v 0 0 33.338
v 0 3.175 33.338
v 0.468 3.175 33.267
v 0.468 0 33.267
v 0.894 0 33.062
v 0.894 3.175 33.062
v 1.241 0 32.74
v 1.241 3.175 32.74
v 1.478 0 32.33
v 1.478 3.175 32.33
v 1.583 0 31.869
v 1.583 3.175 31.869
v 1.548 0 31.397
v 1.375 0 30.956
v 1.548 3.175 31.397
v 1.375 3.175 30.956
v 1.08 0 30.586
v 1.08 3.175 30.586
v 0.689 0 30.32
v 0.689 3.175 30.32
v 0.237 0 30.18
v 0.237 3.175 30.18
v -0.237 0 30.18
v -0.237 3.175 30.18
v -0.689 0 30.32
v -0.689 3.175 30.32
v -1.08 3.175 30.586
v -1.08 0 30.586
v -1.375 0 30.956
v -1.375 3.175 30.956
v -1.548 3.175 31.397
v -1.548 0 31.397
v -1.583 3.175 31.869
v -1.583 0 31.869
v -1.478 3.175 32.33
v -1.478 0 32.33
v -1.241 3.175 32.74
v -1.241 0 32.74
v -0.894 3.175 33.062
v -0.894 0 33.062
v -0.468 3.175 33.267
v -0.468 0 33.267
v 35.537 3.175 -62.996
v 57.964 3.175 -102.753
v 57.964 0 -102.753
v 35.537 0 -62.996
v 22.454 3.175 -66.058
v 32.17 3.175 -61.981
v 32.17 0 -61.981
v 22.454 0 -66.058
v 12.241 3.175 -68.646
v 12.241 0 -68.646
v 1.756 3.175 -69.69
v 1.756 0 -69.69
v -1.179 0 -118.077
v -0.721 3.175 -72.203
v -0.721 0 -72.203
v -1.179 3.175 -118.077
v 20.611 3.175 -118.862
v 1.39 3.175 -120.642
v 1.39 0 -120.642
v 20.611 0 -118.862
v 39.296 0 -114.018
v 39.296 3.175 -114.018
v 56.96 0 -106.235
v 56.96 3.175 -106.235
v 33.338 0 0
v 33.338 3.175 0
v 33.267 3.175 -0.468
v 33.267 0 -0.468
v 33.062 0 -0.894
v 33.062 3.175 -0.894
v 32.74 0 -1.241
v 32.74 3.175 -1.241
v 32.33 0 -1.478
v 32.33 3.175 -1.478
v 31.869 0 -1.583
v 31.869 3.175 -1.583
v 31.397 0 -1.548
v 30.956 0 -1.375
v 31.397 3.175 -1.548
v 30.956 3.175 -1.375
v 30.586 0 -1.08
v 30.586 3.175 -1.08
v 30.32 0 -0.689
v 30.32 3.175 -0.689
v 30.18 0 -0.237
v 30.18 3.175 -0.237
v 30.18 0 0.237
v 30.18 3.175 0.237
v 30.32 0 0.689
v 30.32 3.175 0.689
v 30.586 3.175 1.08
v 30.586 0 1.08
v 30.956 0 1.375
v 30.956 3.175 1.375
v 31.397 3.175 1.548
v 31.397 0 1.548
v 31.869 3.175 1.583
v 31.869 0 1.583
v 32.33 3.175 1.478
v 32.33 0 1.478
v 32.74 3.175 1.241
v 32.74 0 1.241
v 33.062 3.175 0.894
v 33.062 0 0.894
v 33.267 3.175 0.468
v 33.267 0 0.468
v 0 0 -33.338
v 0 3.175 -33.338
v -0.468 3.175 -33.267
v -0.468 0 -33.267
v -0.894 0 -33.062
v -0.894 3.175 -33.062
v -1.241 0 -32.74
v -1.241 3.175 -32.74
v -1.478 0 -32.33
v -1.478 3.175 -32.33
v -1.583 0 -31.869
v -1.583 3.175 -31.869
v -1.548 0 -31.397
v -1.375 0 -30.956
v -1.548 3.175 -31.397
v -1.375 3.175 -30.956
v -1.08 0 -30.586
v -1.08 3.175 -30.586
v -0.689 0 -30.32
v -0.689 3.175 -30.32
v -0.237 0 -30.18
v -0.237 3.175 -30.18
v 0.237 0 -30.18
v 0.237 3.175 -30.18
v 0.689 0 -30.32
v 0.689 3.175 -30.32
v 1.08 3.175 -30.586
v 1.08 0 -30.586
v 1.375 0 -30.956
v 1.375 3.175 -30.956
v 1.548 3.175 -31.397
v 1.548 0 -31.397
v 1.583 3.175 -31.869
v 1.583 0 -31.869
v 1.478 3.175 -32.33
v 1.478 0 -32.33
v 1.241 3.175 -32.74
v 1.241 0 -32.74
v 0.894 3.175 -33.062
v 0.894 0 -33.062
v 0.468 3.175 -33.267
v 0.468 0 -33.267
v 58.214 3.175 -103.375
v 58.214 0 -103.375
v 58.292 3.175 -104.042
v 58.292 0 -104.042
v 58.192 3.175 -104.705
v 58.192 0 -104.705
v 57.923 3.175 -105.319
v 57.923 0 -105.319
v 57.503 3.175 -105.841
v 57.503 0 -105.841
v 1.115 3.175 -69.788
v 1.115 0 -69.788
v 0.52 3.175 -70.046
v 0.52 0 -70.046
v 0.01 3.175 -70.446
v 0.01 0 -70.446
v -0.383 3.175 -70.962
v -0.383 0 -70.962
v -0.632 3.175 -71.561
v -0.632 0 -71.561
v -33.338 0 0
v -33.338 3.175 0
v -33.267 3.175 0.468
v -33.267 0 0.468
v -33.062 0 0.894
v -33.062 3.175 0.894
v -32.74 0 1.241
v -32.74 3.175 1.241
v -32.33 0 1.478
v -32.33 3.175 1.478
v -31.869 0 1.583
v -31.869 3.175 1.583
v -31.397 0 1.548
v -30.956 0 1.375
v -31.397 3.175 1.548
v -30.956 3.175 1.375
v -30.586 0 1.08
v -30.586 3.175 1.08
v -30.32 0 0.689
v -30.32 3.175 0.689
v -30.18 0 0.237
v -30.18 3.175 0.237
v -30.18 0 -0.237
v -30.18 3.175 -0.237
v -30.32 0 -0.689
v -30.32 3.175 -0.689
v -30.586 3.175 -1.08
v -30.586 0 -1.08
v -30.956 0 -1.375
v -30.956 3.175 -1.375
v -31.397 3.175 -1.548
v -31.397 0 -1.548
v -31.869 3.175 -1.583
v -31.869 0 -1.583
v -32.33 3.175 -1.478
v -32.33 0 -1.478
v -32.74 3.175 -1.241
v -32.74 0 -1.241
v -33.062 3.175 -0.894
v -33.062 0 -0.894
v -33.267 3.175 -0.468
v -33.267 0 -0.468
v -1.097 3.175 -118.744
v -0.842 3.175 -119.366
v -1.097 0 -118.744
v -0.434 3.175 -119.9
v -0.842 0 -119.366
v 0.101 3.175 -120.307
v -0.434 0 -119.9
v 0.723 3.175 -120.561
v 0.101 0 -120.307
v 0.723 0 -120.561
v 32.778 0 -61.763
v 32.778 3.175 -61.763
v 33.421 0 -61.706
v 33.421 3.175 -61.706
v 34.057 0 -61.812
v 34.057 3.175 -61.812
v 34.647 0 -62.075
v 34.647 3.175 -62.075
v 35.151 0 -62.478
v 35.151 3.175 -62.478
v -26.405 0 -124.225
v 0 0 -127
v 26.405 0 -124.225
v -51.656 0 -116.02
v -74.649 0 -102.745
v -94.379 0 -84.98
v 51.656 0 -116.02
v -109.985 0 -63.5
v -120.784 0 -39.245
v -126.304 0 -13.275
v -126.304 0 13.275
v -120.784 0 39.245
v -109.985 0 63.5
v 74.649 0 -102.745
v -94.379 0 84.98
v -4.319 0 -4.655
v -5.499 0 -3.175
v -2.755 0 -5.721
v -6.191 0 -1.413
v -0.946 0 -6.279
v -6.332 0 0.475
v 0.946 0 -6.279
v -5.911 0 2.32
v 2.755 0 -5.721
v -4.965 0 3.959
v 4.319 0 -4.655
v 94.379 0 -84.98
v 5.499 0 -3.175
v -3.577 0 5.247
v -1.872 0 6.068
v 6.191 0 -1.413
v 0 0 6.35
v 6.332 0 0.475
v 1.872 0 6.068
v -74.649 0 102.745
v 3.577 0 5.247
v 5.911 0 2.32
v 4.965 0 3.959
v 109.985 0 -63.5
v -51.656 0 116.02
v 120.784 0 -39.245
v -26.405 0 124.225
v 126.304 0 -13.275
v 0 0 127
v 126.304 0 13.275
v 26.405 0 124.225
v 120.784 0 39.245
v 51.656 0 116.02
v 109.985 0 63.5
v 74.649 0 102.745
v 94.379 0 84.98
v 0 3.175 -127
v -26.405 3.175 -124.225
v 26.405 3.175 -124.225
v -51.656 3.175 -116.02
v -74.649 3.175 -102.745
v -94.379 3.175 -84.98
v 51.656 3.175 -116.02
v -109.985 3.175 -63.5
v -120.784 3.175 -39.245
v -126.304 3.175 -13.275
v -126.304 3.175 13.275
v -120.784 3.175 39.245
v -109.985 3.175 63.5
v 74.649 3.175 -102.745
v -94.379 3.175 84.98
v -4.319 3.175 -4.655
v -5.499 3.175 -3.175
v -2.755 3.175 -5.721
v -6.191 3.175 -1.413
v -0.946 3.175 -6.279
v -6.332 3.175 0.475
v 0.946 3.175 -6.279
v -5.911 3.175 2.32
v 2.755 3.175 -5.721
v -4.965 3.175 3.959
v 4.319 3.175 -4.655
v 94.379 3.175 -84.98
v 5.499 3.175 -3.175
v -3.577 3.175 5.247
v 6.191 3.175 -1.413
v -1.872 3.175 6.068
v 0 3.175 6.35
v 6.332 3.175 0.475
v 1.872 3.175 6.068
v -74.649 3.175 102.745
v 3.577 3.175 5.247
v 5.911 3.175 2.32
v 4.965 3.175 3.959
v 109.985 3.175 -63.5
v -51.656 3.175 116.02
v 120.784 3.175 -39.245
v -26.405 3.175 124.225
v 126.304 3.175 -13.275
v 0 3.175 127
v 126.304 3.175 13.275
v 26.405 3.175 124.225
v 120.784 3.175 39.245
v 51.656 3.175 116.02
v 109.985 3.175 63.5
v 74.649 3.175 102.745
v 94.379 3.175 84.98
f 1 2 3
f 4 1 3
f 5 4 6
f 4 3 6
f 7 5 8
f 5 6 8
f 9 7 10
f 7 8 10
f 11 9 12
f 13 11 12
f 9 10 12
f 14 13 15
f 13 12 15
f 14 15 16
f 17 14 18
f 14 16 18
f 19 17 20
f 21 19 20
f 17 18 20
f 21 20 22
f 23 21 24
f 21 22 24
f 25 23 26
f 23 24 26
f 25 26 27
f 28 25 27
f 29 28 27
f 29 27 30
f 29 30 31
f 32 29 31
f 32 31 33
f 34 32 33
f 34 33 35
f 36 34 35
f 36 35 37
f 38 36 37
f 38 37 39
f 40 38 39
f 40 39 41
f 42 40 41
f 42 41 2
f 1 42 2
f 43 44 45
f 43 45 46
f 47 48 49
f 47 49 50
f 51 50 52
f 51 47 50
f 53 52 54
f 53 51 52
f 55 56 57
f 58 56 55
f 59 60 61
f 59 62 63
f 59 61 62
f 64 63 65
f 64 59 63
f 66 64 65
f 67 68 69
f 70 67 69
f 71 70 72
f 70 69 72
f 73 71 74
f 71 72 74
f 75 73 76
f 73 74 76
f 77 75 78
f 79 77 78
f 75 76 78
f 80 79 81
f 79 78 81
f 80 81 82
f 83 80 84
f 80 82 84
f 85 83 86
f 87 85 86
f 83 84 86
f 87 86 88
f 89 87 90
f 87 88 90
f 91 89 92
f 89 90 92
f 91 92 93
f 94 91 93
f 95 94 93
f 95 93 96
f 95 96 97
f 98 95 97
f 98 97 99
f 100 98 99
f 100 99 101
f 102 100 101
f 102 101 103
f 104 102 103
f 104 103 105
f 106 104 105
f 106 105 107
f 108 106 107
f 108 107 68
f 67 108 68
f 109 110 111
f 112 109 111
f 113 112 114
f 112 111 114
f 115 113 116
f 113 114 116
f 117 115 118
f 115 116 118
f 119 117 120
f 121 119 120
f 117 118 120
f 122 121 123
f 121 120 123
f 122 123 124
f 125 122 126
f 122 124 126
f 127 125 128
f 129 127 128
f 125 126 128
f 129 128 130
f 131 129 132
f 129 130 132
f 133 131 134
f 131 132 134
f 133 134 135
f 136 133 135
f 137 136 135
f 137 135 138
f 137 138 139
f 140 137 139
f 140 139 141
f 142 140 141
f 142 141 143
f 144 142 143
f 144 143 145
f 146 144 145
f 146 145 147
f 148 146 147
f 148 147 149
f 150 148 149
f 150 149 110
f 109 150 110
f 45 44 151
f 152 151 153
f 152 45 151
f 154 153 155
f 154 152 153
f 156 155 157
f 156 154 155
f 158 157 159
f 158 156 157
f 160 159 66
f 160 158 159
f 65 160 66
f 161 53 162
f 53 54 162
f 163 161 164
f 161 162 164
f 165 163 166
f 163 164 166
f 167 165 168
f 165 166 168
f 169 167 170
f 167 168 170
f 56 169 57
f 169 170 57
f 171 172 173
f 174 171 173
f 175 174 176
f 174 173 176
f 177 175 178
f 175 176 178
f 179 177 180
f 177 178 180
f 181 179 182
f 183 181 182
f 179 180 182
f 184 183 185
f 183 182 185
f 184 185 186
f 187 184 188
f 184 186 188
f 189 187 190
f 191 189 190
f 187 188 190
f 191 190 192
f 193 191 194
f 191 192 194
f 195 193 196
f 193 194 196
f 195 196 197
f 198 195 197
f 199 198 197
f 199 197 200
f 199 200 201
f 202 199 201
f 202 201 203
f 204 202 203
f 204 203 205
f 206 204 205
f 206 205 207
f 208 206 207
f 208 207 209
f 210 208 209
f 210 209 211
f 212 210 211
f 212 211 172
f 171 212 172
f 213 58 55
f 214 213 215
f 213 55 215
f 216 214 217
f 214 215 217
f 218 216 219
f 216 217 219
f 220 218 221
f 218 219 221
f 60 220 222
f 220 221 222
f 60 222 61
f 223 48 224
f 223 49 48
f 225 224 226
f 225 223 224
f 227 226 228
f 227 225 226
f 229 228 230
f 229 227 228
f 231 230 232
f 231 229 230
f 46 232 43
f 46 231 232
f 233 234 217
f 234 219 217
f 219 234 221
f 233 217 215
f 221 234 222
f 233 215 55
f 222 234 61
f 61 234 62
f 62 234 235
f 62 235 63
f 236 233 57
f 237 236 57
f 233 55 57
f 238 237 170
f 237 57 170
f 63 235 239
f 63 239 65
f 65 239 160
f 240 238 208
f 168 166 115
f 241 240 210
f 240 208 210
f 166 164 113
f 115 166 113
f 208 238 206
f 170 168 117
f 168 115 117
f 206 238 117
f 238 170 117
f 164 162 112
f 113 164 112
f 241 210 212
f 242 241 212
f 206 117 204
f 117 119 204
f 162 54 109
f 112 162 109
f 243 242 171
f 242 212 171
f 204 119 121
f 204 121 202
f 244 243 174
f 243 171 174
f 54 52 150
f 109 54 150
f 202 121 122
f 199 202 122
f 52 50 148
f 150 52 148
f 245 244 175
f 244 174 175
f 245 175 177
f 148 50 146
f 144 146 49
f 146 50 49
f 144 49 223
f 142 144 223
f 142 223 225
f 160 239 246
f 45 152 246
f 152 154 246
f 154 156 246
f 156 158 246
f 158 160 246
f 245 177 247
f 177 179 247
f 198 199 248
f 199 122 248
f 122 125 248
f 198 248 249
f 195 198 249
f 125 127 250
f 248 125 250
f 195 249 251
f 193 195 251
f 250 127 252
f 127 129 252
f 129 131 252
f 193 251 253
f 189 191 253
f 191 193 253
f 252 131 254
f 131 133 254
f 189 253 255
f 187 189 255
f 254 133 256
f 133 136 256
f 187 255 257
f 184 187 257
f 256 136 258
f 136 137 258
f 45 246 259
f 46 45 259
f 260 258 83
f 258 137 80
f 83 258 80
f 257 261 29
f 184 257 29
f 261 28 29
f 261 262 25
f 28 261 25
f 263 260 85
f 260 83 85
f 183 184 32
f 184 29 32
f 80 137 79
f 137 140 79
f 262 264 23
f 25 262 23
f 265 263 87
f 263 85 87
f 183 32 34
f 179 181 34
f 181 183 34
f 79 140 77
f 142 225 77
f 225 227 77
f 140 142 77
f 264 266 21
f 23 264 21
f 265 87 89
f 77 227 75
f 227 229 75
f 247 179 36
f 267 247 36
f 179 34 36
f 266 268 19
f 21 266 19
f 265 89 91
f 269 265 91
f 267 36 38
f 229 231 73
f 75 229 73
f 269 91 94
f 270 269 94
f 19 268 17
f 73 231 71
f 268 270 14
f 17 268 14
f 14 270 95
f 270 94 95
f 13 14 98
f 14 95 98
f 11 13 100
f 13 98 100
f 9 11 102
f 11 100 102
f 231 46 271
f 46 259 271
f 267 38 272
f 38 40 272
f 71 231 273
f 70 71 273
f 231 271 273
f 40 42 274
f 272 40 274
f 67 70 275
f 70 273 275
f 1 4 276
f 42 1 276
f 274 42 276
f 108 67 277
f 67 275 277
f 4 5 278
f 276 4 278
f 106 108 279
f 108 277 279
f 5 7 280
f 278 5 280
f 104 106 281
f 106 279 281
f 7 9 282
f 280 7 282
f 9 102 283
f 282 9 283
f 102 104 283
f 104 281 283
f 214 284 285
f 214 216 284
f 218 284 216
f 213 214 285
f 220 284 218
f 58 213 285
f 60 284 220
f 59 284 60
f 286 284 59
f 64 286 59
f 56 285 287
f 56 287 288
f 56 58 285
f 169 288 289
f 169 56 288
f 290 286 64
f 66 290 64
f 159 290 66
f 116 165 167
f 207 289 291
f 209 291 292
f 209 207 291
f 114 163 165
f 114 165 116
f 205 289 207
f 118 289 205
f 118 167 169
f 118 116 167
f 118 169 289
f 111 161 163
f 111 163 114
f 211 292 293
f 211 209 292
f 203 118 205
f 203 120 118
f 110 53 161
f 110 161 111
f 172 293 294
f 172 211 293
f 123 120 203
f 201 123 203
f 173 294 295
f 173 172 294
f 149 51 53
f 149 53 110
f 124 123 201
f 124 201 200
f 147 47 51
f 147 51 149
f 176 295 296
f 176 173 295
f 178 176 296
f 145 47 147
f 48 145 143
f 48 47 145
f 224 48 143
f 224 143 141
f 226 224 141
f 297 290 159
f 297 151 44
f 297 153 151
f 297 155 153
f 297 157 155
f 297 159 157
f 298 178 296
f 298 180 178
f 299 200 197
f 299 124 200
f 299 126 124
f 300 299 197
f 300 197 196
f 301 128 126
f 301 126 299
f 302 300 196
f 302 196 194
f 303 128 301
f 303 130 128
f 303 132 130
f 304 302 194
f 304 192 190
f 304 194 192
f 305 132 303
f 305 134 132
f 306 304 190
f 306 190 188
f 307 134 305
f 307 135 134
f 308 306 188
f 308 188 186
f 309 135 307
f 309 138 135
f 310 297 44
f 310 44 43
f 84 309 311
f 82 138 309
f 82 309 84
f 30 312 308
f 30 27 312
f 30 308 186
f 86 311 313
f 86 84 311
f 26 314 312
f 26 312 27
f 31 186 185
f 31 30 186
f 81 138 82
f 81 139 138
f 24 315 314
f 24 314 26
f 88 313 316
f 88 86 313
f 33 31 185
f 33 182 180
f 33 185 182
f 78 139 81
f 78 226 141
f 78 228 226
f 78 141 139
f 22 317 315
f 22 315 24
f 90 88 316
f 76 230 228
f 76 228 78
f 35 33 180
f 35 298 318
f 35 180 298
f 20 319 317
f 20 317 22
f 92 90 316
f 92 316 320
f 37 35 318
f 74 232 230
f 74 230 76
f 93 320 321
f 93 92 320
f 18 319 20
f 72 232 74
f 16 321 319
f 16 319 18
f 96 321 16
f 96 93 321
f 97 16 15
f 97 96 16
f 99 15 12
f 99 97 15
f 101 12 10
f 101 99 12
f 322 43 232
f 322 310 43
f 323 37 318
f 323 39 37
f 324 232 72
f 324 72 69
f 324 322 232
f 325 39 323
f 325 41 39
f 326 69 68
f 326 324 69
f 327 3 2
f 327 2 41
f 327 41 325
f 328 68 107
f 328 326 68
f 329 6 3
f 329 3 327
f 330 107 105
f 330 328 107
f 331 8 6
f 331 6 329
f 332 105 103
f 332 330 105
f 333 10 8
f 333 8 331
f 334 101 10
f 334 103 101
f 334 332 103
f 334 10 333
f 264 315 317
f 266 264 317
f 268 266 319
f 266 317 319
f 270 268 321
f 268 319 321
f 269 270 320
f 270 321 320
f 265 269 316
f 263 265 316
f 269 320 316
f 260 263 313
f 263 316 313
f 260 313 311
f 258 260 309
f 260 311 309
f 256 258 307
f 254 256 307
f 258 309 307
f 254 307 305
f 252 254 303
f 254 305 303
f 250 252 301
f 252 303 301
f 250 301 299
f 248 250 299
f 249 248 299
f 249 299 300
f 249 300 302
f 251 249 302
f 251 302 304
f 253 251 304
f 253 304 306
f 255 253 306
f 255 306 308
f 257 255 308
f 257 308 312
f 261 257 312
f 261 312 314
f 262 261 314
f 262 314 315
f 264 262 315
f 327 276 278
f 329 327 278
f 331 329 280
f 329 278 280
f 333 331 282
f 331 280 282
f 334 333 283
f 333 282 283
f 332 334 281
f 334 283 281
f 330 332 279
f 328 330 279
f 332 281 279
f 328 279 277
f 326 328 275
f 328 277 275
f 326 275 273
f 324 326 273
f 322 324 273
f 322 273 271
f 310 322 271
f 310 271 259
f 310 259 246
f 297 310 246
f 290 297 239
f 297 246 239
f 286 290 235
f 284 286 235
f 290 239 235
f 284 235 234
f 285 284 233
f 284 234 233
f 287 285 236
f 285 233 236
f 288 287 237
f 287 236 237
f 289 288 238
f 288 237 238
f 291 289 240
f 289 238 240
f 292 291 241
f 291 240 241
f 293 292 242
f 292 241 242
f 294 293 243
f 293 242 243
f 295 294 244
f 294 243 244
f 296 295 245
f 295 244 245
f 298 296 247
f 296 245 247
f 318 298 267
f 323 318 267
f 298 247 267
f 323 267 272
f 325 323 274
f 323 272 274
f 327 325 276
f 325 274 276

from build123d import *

# Parameters (mm, degrees)
SKETCH1_R           = 127
BOSS_EXTRUDE1_DEPTH = 3.175
SKETCH2_R           = 6.35
CUT_EXTRUDE1_DEPTH  = 180.63318353
CUT_EXTRUDE2_DEPTH  = 180.63318353
SKETCH4_R           = 1.5875
CUT_EXTRUDE3_DEPTH  = 180.63318353
CIRPATTERN1_COUNT   = 4
FILLET1_R           = 2.54


with BuildPart() as part:
    # Sketch1 → Boss-Extrude1 (new body)
    with BuildSketch(Plane(origin=(0, 0, 0), x_dir=(1, 0, 0), z_dir=(0, 1, 0))):
        with Locations(Location((0, 0, 0), (0, 0, 270))):
            Circle(SKETCH1_R)
    extrude(amount=BOSS_EXTRUDE1_DEPTH)

    # Sketch2 → Cut-Extrude1 (cut, through all)
    with BuildSketch(Plane(origin=(0, 3.175, 0), x_dir=(1, 0, 0), z_dir=(0, 1, 0))):
        with Locations(Location((0, 0, 0), (0, 0, 270))):
            Circle(SKETCH2_R)
    extrude(amount=-CUT_EXTRUDE1_DEPTH, mode=Mode.SUBTRACT)

    # Sketch3 → Cut-Extrude2 (cut, through all)
    with BuildSketch(Plane(origin=(0, 3.175, 0), x_dir=(1, 0, 0), z_dir=(0, 1, 0))):
        with BuildLine():
            Line((-0.69608151, 69.707591228), (-1.204718825, 120.643985149))
            ThreePointArc((-1.204718825, 120.643985149), (30.046443244, 116.817986877), (59.221085226, 104.981025331))
            Line((59.221085226, 104.981025331), (34.319233166, 60.837593106))
            ThreePointArc((34.319233166, 60.837593106), (17.387075213, 67.544440681), (-0.69608151, 69.707591228))
        make_face()
    extrude(amount=-CUT_EXTRUDE2_DEPTH, mode=Mode.SUBTRACT)

    # Sketch4 → Cut-Extrude3 (cut, through all)
    with BuildSketch(Plane(origin=(0, 3.175, 0), x_dir=(1, 0, 0), z_dir=(0, 1, 0))):
        with Locations(Location((0, -31.75, 0), (0, 0, 270))):
            Circle(SKETCH4_R)
    cut_extrude3 = extrude(amount=-CUT_EXTRUDE3_DEPTH, mode=Mode.SUBTRACT)

    # CirPattern1: Cut-Extrude3 ×4 about axis
    cirpattern1_axis = Axis((0, 0, 0), (0, 1, 0))
    for i in range(1, CIRPATTERN1_COUNT):
        add(cut_extrude3.rotate(cirpattern1_axis, i * 360 / CIRPATTERN1_COUNT), mode=Mode.SUBTRACT)

    # Fillet1
    fillet1_edges = [part.edges().sort_by_distance(p)[0] for p in [
        (34.319233166, 1.5875, -60.837593106),
        (-0.69608151, 1.5875, -69.707591228),
        (-1.204718825, 1.5875, -120.643985149),
        (59.221085226, 1.5875, -104.981025331),
    ]]
    fillet(fillet1_edges, radius=FILLET1_R)


solid = part.part
